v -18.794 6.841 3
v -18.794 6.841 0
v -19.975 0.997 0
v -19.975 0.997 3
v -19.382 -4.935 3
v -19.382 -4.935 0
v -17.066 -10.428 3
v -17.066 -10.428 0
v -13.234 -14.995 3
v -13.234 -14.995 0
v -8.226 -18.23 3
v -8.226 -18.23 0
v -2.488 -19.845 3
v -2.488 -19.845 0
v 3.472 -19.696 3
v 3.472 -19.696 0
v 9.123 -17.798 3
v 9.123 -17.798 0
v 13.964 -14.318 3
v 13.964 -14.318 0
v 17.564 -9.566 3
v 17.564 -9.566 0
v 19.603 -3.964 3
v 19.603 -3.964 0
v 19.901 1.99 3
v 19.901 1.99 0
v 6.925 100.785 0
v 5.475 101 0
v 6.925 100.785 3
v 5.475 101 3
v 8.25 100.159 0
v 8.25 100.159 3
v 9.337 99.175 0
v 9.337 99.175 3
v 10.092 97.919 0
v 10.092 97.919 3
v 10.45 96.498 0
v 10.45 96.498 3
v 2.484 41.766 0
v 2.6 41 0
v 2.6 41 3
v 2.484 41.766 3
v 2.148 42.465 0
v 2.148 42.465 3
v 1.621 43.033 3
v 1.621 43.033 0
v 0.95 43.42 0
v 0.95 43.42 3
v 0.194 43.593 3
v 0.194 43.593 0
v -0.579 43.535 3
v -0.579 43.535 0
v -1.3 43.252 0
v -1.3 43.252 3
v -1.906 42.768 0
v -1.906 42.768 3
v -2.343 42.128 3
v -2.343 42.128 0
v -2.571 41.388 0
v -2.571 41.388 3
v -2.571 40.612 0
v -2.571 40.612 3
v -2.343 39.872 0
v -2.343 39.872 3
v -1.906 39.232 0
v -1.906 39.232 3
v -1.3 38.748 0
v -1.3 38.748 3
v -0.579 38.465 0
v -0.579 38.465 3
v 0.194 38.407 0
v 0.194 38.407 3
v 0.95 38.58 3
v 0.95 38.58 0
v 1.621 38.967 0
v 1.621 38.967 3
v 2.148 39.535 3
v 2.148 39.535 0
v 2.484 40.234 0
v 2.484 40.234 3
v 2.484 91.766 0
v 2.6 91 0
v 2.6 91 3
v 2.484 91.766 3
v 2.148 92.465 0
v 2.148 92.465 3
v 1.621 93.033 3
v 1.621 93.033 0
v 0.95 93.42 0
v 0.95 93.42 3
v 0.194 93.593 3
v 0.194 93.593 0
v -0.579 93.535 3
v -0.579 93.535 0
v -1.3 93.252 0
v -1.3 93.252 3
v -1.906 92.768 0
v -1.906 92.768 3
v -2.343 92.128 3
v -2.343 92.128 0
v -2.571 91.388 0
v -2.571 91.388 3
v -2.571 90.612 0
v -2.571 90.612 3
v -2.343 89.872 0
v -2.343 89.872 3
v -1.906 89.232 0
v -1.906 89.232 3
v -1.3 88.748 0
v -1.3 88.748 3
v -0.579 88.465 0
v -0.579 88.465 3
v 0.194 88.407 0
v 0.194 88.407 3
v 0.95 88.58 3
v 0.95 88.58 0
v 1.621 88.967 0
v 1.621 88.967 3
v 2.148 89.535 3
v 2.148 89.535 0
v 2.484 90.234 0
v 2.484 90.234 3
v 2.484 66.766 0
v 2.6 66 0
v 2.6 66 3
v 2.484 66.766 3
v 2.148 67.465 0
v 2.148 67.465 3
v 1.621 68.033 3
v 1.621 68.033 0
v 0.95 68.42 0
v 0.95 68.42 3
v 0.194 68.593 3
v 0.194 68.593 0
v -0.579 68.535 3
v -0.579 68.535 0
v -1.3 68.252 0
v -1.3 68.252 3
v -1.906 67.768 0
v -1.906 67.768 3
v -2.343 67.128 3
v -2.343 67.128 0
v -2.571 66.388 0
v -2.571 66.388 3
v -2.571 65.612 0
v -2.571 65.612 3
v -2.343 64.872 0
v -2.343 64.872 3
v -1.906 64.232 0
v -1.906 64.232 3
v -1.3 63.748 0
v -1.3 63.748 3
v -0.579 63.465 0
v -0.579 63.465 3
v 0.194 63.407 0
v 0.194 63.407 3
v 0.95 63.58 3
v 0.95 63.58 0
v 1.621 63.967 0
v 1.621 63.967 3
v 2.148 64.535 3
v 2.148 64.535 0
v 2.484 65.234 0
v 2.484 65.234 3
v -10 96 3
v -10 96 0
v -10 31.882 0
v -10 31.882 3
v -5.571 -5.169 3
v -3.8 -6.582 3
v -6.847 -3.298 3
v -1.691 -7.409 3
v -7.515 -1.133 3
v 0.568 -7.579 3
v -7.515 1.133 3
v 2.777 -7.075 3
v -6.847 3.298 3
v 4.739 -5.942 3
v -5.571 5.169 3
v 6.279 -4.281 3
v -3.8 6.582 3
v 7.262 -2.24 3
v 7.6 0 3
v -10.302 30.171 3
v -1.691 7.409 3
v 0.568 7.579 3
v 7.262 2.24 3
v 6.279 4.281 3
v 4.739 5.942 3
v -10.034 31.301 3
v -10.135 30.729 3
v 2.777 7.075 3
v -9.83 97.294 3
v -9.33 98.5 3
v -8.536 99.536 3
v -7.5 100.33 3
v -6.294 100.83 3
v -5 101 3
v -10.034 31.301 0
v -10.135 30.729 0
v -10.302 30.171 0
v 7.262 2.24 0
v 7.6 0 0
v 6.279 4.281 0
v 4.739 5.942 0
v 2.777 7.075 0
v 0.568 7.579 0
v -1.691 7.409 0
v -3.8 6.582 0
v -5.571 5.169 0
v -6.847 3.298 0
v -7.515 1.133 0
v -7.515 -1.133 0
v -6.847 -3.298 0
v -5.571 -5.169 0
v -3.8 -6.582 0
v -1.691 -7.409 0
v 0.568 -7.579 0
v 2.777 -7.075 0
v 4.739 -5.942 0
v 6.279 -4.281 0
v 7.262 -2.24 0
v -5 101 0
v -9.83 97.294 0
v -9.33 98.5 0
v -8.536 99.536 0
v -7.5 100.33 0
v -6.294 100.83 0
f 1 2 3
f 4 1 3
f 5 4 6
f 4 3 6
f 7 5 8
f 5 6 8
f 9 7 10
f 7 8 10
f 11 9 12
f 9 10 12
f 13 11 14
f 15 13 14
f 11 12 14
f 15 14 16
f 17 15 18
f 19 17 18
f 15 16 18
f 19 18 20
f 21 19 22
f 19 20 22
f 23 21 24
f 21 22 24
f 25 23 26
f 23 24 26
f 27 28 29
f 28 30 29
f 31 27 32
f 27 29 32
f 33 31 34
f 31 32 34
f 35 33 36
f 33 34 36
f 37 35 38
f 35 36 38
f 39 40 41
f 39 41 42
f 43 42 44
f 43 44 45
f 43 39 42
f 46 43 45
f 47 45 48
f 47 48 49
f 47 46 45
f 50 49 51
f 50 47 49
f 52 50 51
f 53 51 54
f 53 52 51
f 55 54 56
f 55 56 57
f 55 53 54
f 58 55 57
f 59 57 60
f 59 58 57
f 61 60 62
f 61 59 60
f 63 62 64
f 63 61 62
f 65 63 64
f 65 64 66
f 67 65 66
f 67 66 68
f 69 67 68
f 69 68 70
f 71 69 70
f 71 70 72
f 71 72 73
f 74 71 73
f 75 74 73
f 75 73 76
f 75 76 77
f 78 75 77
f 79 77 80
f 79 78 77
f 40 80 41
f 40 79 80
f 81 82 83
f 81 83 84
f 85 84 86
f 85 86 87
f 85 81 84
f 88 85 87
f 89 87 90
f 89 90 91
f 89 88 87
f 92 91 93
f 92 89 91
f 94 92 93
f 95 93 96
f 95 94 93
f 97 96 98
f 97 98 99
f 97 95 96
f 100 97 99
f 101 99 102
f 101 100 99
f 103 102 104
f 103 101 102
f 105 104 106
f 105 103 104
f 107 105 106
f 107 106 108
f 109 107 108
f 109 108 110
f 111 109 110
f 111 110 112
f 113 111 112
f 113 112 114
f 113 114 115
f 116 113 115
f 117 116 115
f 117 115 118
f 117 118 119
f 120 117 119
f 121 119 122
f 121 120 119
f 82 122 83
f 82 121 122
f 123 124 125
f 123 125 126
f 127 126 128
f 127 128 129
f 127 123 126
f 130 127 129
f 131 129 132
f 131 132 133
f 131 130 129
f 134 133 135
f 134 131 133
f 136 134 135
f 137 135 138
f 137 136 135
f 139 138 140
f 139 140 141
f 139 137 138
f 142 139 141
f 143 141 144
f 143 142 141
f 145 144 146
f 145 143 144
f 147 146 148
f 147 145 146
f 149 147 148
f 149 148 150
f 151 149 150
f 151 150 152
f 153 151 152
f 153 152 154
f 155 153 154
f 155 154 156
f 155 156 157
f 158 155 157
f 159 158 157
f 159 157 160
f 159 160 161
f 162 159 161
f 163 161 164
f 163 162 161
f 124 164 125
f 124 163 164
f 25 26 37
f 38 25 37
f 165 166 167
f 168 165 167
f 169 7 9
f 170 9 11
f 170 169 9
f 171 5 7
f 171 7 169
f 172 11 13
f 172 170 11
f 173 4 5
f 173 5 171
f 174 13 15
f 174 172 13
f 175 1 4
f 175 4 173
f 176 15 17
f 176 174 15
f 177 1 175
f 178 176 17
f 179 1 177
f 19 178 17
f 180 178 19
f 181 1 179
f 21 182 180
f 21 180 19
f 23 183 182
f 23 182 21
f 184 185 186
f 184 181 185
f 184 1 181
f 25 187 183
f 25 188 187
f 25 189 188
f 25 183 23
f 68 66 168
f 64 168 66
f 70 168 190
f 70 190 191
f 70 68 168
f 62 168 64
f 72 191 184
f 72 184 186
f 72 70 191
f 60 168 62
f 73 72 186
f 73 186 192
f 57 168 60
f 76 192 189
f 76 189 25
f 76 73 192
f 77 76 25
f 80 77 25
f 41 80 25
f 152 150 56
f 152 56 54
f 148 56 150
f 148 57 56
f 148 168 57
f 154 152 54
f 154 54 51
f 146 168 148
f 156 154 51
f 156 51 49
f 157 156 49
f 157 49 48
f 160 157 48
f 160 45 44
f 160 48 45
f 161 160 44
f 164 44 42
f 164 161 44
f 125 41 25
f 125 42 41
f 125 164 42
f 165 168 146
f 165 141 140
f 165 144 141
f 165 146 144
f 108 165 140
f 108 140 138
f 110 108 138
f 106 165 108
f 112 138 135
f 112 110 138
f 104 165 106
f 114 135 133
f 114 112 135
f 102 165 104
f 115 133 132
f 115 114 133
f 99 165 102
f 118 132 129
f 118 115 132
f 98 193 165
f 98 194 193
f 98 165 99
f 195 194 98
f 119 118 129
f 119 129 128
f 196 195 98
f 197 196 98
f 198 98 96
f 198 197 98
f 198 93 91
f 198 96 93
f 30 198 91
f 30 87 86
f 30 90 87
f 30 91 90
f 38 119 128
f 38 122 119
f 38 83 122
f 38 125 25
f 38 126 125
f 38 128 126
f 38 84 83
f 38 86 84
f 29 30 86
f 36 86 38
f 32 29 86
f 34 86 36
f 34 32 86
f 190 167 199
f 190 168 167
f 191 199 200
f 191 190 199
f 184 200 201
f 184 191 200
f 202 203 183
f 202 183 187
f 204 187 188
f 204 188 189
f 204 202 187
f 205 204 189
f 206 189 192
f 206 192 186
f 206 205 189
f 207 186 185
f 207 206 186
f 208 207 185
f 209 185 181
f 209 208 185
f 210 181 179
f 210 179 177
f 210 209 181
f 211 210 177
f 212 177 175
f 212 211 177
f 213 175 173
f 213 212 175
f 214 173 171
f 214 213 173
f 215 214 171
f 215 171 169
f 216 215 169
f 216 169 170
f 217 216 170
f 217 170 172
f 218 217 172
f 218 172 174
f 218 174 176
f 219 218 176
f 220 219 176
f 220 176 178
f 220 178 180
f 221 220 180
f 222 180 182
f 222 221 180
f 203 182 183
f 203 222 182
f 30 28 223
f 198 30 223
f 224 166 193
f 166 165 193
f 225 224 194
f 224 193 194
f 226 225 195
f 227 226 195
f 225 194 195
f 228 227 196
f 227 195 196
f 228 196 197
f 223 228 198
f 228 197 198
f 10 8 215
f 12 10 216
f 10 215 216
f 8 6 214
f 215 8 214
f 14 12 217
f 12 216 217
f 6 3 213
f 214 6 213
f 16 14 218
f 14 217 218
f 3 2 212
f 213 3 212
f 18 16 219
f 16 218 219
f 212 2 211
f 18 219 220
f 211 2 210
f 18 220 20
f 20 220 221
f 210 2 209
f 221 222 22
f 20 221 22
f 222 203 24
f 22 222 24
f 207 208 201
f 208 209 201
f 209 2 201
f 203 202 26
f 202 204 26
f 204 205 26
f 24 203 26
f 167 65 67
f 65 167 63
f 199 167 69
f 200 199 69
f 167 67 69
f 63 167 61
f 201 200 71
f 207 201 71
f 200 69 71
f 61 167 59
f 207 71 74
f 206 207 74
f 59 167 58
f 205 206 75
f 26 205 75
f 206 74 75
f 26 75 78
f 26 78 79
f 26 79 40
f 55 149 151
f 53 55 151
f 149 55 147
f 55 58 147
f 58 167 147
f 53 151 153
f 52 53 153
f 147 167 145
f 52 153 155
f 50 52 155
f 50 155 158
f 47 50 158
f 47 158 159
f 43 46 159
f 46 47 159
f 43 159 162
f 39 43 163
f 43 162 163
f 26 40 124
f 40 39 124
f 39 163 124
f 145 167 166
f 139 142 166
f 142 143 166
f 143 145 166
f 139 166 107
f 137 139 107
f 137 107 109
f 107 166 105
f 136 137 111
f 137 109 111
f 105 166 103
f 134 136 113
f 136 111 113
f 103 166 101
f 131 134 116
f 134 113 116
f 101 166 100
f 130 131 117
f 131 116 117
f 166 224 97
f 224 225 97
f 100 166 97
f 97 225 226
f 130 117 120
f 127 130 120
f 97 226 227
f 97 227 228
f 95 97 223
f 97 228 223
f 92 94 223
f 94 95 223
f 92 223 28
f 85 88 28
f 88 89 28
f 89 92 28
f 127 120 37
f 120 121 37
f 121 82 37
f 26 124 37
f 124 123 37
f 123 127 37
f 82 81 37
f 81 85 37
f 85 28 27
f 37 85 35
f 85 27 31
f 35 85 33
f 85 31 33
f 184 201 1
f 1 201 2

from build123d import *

# Parameters (mm, degrees)
SKETCH_2_R      = 7.6
SKETCH_2_R_2    = 2.6
EXTRUDE_1_DEPTH = 3
FILLET_7_R      = 5


with BuildPart() as part:
    # ｽｹｯﾁ2 → ﾎﾞｽ - 押し出し1 (new body)
    with BuildSketch(Plane.XY):
        with BuildLine():
            Line((-10, 101), (-10, 31))
            Line((-10, 31), (-18.793732859, 6.840731336))
            ThreePointArc((-18.793732859, 6.840731336), (-2.487711667, -19.844679152), (19.900748755, 1.990024876))
            Line((19.900748755, 1.990024876), (10, 101))
            Line((10, 101), (-10, 101))
        make_face()
        Circle(SKETCH_2_R, mode=Mode.SUBTRACT)
        with Locations((0, 66)):
            Circle(SKETCH_2_R_2, mode=Mode.SUBTRACT)
        with Locations((0, 91)):
            Circle(SKETCH_2_R_2, mode=Mode.SUBTRACT)
        with Locations((0, 41)):
            Circle(SKETCH_2_R_2, mode=Mode.SUBTRACT)
    extrude(amount=EXTRUDE_1_DEPTH)

    # ﾌｨﾚｯﾄ7
    fillet_7_edges = [part.edges().sort_by_distance(p)[0] for p in [
        (10, 101, 1.5),
        (-10, 31, 1.5),
        (-10, 101, 1.5),
    ]]
    fillet(fillet_7_edges, radius=FILLET_7_R)


solid = part.part
